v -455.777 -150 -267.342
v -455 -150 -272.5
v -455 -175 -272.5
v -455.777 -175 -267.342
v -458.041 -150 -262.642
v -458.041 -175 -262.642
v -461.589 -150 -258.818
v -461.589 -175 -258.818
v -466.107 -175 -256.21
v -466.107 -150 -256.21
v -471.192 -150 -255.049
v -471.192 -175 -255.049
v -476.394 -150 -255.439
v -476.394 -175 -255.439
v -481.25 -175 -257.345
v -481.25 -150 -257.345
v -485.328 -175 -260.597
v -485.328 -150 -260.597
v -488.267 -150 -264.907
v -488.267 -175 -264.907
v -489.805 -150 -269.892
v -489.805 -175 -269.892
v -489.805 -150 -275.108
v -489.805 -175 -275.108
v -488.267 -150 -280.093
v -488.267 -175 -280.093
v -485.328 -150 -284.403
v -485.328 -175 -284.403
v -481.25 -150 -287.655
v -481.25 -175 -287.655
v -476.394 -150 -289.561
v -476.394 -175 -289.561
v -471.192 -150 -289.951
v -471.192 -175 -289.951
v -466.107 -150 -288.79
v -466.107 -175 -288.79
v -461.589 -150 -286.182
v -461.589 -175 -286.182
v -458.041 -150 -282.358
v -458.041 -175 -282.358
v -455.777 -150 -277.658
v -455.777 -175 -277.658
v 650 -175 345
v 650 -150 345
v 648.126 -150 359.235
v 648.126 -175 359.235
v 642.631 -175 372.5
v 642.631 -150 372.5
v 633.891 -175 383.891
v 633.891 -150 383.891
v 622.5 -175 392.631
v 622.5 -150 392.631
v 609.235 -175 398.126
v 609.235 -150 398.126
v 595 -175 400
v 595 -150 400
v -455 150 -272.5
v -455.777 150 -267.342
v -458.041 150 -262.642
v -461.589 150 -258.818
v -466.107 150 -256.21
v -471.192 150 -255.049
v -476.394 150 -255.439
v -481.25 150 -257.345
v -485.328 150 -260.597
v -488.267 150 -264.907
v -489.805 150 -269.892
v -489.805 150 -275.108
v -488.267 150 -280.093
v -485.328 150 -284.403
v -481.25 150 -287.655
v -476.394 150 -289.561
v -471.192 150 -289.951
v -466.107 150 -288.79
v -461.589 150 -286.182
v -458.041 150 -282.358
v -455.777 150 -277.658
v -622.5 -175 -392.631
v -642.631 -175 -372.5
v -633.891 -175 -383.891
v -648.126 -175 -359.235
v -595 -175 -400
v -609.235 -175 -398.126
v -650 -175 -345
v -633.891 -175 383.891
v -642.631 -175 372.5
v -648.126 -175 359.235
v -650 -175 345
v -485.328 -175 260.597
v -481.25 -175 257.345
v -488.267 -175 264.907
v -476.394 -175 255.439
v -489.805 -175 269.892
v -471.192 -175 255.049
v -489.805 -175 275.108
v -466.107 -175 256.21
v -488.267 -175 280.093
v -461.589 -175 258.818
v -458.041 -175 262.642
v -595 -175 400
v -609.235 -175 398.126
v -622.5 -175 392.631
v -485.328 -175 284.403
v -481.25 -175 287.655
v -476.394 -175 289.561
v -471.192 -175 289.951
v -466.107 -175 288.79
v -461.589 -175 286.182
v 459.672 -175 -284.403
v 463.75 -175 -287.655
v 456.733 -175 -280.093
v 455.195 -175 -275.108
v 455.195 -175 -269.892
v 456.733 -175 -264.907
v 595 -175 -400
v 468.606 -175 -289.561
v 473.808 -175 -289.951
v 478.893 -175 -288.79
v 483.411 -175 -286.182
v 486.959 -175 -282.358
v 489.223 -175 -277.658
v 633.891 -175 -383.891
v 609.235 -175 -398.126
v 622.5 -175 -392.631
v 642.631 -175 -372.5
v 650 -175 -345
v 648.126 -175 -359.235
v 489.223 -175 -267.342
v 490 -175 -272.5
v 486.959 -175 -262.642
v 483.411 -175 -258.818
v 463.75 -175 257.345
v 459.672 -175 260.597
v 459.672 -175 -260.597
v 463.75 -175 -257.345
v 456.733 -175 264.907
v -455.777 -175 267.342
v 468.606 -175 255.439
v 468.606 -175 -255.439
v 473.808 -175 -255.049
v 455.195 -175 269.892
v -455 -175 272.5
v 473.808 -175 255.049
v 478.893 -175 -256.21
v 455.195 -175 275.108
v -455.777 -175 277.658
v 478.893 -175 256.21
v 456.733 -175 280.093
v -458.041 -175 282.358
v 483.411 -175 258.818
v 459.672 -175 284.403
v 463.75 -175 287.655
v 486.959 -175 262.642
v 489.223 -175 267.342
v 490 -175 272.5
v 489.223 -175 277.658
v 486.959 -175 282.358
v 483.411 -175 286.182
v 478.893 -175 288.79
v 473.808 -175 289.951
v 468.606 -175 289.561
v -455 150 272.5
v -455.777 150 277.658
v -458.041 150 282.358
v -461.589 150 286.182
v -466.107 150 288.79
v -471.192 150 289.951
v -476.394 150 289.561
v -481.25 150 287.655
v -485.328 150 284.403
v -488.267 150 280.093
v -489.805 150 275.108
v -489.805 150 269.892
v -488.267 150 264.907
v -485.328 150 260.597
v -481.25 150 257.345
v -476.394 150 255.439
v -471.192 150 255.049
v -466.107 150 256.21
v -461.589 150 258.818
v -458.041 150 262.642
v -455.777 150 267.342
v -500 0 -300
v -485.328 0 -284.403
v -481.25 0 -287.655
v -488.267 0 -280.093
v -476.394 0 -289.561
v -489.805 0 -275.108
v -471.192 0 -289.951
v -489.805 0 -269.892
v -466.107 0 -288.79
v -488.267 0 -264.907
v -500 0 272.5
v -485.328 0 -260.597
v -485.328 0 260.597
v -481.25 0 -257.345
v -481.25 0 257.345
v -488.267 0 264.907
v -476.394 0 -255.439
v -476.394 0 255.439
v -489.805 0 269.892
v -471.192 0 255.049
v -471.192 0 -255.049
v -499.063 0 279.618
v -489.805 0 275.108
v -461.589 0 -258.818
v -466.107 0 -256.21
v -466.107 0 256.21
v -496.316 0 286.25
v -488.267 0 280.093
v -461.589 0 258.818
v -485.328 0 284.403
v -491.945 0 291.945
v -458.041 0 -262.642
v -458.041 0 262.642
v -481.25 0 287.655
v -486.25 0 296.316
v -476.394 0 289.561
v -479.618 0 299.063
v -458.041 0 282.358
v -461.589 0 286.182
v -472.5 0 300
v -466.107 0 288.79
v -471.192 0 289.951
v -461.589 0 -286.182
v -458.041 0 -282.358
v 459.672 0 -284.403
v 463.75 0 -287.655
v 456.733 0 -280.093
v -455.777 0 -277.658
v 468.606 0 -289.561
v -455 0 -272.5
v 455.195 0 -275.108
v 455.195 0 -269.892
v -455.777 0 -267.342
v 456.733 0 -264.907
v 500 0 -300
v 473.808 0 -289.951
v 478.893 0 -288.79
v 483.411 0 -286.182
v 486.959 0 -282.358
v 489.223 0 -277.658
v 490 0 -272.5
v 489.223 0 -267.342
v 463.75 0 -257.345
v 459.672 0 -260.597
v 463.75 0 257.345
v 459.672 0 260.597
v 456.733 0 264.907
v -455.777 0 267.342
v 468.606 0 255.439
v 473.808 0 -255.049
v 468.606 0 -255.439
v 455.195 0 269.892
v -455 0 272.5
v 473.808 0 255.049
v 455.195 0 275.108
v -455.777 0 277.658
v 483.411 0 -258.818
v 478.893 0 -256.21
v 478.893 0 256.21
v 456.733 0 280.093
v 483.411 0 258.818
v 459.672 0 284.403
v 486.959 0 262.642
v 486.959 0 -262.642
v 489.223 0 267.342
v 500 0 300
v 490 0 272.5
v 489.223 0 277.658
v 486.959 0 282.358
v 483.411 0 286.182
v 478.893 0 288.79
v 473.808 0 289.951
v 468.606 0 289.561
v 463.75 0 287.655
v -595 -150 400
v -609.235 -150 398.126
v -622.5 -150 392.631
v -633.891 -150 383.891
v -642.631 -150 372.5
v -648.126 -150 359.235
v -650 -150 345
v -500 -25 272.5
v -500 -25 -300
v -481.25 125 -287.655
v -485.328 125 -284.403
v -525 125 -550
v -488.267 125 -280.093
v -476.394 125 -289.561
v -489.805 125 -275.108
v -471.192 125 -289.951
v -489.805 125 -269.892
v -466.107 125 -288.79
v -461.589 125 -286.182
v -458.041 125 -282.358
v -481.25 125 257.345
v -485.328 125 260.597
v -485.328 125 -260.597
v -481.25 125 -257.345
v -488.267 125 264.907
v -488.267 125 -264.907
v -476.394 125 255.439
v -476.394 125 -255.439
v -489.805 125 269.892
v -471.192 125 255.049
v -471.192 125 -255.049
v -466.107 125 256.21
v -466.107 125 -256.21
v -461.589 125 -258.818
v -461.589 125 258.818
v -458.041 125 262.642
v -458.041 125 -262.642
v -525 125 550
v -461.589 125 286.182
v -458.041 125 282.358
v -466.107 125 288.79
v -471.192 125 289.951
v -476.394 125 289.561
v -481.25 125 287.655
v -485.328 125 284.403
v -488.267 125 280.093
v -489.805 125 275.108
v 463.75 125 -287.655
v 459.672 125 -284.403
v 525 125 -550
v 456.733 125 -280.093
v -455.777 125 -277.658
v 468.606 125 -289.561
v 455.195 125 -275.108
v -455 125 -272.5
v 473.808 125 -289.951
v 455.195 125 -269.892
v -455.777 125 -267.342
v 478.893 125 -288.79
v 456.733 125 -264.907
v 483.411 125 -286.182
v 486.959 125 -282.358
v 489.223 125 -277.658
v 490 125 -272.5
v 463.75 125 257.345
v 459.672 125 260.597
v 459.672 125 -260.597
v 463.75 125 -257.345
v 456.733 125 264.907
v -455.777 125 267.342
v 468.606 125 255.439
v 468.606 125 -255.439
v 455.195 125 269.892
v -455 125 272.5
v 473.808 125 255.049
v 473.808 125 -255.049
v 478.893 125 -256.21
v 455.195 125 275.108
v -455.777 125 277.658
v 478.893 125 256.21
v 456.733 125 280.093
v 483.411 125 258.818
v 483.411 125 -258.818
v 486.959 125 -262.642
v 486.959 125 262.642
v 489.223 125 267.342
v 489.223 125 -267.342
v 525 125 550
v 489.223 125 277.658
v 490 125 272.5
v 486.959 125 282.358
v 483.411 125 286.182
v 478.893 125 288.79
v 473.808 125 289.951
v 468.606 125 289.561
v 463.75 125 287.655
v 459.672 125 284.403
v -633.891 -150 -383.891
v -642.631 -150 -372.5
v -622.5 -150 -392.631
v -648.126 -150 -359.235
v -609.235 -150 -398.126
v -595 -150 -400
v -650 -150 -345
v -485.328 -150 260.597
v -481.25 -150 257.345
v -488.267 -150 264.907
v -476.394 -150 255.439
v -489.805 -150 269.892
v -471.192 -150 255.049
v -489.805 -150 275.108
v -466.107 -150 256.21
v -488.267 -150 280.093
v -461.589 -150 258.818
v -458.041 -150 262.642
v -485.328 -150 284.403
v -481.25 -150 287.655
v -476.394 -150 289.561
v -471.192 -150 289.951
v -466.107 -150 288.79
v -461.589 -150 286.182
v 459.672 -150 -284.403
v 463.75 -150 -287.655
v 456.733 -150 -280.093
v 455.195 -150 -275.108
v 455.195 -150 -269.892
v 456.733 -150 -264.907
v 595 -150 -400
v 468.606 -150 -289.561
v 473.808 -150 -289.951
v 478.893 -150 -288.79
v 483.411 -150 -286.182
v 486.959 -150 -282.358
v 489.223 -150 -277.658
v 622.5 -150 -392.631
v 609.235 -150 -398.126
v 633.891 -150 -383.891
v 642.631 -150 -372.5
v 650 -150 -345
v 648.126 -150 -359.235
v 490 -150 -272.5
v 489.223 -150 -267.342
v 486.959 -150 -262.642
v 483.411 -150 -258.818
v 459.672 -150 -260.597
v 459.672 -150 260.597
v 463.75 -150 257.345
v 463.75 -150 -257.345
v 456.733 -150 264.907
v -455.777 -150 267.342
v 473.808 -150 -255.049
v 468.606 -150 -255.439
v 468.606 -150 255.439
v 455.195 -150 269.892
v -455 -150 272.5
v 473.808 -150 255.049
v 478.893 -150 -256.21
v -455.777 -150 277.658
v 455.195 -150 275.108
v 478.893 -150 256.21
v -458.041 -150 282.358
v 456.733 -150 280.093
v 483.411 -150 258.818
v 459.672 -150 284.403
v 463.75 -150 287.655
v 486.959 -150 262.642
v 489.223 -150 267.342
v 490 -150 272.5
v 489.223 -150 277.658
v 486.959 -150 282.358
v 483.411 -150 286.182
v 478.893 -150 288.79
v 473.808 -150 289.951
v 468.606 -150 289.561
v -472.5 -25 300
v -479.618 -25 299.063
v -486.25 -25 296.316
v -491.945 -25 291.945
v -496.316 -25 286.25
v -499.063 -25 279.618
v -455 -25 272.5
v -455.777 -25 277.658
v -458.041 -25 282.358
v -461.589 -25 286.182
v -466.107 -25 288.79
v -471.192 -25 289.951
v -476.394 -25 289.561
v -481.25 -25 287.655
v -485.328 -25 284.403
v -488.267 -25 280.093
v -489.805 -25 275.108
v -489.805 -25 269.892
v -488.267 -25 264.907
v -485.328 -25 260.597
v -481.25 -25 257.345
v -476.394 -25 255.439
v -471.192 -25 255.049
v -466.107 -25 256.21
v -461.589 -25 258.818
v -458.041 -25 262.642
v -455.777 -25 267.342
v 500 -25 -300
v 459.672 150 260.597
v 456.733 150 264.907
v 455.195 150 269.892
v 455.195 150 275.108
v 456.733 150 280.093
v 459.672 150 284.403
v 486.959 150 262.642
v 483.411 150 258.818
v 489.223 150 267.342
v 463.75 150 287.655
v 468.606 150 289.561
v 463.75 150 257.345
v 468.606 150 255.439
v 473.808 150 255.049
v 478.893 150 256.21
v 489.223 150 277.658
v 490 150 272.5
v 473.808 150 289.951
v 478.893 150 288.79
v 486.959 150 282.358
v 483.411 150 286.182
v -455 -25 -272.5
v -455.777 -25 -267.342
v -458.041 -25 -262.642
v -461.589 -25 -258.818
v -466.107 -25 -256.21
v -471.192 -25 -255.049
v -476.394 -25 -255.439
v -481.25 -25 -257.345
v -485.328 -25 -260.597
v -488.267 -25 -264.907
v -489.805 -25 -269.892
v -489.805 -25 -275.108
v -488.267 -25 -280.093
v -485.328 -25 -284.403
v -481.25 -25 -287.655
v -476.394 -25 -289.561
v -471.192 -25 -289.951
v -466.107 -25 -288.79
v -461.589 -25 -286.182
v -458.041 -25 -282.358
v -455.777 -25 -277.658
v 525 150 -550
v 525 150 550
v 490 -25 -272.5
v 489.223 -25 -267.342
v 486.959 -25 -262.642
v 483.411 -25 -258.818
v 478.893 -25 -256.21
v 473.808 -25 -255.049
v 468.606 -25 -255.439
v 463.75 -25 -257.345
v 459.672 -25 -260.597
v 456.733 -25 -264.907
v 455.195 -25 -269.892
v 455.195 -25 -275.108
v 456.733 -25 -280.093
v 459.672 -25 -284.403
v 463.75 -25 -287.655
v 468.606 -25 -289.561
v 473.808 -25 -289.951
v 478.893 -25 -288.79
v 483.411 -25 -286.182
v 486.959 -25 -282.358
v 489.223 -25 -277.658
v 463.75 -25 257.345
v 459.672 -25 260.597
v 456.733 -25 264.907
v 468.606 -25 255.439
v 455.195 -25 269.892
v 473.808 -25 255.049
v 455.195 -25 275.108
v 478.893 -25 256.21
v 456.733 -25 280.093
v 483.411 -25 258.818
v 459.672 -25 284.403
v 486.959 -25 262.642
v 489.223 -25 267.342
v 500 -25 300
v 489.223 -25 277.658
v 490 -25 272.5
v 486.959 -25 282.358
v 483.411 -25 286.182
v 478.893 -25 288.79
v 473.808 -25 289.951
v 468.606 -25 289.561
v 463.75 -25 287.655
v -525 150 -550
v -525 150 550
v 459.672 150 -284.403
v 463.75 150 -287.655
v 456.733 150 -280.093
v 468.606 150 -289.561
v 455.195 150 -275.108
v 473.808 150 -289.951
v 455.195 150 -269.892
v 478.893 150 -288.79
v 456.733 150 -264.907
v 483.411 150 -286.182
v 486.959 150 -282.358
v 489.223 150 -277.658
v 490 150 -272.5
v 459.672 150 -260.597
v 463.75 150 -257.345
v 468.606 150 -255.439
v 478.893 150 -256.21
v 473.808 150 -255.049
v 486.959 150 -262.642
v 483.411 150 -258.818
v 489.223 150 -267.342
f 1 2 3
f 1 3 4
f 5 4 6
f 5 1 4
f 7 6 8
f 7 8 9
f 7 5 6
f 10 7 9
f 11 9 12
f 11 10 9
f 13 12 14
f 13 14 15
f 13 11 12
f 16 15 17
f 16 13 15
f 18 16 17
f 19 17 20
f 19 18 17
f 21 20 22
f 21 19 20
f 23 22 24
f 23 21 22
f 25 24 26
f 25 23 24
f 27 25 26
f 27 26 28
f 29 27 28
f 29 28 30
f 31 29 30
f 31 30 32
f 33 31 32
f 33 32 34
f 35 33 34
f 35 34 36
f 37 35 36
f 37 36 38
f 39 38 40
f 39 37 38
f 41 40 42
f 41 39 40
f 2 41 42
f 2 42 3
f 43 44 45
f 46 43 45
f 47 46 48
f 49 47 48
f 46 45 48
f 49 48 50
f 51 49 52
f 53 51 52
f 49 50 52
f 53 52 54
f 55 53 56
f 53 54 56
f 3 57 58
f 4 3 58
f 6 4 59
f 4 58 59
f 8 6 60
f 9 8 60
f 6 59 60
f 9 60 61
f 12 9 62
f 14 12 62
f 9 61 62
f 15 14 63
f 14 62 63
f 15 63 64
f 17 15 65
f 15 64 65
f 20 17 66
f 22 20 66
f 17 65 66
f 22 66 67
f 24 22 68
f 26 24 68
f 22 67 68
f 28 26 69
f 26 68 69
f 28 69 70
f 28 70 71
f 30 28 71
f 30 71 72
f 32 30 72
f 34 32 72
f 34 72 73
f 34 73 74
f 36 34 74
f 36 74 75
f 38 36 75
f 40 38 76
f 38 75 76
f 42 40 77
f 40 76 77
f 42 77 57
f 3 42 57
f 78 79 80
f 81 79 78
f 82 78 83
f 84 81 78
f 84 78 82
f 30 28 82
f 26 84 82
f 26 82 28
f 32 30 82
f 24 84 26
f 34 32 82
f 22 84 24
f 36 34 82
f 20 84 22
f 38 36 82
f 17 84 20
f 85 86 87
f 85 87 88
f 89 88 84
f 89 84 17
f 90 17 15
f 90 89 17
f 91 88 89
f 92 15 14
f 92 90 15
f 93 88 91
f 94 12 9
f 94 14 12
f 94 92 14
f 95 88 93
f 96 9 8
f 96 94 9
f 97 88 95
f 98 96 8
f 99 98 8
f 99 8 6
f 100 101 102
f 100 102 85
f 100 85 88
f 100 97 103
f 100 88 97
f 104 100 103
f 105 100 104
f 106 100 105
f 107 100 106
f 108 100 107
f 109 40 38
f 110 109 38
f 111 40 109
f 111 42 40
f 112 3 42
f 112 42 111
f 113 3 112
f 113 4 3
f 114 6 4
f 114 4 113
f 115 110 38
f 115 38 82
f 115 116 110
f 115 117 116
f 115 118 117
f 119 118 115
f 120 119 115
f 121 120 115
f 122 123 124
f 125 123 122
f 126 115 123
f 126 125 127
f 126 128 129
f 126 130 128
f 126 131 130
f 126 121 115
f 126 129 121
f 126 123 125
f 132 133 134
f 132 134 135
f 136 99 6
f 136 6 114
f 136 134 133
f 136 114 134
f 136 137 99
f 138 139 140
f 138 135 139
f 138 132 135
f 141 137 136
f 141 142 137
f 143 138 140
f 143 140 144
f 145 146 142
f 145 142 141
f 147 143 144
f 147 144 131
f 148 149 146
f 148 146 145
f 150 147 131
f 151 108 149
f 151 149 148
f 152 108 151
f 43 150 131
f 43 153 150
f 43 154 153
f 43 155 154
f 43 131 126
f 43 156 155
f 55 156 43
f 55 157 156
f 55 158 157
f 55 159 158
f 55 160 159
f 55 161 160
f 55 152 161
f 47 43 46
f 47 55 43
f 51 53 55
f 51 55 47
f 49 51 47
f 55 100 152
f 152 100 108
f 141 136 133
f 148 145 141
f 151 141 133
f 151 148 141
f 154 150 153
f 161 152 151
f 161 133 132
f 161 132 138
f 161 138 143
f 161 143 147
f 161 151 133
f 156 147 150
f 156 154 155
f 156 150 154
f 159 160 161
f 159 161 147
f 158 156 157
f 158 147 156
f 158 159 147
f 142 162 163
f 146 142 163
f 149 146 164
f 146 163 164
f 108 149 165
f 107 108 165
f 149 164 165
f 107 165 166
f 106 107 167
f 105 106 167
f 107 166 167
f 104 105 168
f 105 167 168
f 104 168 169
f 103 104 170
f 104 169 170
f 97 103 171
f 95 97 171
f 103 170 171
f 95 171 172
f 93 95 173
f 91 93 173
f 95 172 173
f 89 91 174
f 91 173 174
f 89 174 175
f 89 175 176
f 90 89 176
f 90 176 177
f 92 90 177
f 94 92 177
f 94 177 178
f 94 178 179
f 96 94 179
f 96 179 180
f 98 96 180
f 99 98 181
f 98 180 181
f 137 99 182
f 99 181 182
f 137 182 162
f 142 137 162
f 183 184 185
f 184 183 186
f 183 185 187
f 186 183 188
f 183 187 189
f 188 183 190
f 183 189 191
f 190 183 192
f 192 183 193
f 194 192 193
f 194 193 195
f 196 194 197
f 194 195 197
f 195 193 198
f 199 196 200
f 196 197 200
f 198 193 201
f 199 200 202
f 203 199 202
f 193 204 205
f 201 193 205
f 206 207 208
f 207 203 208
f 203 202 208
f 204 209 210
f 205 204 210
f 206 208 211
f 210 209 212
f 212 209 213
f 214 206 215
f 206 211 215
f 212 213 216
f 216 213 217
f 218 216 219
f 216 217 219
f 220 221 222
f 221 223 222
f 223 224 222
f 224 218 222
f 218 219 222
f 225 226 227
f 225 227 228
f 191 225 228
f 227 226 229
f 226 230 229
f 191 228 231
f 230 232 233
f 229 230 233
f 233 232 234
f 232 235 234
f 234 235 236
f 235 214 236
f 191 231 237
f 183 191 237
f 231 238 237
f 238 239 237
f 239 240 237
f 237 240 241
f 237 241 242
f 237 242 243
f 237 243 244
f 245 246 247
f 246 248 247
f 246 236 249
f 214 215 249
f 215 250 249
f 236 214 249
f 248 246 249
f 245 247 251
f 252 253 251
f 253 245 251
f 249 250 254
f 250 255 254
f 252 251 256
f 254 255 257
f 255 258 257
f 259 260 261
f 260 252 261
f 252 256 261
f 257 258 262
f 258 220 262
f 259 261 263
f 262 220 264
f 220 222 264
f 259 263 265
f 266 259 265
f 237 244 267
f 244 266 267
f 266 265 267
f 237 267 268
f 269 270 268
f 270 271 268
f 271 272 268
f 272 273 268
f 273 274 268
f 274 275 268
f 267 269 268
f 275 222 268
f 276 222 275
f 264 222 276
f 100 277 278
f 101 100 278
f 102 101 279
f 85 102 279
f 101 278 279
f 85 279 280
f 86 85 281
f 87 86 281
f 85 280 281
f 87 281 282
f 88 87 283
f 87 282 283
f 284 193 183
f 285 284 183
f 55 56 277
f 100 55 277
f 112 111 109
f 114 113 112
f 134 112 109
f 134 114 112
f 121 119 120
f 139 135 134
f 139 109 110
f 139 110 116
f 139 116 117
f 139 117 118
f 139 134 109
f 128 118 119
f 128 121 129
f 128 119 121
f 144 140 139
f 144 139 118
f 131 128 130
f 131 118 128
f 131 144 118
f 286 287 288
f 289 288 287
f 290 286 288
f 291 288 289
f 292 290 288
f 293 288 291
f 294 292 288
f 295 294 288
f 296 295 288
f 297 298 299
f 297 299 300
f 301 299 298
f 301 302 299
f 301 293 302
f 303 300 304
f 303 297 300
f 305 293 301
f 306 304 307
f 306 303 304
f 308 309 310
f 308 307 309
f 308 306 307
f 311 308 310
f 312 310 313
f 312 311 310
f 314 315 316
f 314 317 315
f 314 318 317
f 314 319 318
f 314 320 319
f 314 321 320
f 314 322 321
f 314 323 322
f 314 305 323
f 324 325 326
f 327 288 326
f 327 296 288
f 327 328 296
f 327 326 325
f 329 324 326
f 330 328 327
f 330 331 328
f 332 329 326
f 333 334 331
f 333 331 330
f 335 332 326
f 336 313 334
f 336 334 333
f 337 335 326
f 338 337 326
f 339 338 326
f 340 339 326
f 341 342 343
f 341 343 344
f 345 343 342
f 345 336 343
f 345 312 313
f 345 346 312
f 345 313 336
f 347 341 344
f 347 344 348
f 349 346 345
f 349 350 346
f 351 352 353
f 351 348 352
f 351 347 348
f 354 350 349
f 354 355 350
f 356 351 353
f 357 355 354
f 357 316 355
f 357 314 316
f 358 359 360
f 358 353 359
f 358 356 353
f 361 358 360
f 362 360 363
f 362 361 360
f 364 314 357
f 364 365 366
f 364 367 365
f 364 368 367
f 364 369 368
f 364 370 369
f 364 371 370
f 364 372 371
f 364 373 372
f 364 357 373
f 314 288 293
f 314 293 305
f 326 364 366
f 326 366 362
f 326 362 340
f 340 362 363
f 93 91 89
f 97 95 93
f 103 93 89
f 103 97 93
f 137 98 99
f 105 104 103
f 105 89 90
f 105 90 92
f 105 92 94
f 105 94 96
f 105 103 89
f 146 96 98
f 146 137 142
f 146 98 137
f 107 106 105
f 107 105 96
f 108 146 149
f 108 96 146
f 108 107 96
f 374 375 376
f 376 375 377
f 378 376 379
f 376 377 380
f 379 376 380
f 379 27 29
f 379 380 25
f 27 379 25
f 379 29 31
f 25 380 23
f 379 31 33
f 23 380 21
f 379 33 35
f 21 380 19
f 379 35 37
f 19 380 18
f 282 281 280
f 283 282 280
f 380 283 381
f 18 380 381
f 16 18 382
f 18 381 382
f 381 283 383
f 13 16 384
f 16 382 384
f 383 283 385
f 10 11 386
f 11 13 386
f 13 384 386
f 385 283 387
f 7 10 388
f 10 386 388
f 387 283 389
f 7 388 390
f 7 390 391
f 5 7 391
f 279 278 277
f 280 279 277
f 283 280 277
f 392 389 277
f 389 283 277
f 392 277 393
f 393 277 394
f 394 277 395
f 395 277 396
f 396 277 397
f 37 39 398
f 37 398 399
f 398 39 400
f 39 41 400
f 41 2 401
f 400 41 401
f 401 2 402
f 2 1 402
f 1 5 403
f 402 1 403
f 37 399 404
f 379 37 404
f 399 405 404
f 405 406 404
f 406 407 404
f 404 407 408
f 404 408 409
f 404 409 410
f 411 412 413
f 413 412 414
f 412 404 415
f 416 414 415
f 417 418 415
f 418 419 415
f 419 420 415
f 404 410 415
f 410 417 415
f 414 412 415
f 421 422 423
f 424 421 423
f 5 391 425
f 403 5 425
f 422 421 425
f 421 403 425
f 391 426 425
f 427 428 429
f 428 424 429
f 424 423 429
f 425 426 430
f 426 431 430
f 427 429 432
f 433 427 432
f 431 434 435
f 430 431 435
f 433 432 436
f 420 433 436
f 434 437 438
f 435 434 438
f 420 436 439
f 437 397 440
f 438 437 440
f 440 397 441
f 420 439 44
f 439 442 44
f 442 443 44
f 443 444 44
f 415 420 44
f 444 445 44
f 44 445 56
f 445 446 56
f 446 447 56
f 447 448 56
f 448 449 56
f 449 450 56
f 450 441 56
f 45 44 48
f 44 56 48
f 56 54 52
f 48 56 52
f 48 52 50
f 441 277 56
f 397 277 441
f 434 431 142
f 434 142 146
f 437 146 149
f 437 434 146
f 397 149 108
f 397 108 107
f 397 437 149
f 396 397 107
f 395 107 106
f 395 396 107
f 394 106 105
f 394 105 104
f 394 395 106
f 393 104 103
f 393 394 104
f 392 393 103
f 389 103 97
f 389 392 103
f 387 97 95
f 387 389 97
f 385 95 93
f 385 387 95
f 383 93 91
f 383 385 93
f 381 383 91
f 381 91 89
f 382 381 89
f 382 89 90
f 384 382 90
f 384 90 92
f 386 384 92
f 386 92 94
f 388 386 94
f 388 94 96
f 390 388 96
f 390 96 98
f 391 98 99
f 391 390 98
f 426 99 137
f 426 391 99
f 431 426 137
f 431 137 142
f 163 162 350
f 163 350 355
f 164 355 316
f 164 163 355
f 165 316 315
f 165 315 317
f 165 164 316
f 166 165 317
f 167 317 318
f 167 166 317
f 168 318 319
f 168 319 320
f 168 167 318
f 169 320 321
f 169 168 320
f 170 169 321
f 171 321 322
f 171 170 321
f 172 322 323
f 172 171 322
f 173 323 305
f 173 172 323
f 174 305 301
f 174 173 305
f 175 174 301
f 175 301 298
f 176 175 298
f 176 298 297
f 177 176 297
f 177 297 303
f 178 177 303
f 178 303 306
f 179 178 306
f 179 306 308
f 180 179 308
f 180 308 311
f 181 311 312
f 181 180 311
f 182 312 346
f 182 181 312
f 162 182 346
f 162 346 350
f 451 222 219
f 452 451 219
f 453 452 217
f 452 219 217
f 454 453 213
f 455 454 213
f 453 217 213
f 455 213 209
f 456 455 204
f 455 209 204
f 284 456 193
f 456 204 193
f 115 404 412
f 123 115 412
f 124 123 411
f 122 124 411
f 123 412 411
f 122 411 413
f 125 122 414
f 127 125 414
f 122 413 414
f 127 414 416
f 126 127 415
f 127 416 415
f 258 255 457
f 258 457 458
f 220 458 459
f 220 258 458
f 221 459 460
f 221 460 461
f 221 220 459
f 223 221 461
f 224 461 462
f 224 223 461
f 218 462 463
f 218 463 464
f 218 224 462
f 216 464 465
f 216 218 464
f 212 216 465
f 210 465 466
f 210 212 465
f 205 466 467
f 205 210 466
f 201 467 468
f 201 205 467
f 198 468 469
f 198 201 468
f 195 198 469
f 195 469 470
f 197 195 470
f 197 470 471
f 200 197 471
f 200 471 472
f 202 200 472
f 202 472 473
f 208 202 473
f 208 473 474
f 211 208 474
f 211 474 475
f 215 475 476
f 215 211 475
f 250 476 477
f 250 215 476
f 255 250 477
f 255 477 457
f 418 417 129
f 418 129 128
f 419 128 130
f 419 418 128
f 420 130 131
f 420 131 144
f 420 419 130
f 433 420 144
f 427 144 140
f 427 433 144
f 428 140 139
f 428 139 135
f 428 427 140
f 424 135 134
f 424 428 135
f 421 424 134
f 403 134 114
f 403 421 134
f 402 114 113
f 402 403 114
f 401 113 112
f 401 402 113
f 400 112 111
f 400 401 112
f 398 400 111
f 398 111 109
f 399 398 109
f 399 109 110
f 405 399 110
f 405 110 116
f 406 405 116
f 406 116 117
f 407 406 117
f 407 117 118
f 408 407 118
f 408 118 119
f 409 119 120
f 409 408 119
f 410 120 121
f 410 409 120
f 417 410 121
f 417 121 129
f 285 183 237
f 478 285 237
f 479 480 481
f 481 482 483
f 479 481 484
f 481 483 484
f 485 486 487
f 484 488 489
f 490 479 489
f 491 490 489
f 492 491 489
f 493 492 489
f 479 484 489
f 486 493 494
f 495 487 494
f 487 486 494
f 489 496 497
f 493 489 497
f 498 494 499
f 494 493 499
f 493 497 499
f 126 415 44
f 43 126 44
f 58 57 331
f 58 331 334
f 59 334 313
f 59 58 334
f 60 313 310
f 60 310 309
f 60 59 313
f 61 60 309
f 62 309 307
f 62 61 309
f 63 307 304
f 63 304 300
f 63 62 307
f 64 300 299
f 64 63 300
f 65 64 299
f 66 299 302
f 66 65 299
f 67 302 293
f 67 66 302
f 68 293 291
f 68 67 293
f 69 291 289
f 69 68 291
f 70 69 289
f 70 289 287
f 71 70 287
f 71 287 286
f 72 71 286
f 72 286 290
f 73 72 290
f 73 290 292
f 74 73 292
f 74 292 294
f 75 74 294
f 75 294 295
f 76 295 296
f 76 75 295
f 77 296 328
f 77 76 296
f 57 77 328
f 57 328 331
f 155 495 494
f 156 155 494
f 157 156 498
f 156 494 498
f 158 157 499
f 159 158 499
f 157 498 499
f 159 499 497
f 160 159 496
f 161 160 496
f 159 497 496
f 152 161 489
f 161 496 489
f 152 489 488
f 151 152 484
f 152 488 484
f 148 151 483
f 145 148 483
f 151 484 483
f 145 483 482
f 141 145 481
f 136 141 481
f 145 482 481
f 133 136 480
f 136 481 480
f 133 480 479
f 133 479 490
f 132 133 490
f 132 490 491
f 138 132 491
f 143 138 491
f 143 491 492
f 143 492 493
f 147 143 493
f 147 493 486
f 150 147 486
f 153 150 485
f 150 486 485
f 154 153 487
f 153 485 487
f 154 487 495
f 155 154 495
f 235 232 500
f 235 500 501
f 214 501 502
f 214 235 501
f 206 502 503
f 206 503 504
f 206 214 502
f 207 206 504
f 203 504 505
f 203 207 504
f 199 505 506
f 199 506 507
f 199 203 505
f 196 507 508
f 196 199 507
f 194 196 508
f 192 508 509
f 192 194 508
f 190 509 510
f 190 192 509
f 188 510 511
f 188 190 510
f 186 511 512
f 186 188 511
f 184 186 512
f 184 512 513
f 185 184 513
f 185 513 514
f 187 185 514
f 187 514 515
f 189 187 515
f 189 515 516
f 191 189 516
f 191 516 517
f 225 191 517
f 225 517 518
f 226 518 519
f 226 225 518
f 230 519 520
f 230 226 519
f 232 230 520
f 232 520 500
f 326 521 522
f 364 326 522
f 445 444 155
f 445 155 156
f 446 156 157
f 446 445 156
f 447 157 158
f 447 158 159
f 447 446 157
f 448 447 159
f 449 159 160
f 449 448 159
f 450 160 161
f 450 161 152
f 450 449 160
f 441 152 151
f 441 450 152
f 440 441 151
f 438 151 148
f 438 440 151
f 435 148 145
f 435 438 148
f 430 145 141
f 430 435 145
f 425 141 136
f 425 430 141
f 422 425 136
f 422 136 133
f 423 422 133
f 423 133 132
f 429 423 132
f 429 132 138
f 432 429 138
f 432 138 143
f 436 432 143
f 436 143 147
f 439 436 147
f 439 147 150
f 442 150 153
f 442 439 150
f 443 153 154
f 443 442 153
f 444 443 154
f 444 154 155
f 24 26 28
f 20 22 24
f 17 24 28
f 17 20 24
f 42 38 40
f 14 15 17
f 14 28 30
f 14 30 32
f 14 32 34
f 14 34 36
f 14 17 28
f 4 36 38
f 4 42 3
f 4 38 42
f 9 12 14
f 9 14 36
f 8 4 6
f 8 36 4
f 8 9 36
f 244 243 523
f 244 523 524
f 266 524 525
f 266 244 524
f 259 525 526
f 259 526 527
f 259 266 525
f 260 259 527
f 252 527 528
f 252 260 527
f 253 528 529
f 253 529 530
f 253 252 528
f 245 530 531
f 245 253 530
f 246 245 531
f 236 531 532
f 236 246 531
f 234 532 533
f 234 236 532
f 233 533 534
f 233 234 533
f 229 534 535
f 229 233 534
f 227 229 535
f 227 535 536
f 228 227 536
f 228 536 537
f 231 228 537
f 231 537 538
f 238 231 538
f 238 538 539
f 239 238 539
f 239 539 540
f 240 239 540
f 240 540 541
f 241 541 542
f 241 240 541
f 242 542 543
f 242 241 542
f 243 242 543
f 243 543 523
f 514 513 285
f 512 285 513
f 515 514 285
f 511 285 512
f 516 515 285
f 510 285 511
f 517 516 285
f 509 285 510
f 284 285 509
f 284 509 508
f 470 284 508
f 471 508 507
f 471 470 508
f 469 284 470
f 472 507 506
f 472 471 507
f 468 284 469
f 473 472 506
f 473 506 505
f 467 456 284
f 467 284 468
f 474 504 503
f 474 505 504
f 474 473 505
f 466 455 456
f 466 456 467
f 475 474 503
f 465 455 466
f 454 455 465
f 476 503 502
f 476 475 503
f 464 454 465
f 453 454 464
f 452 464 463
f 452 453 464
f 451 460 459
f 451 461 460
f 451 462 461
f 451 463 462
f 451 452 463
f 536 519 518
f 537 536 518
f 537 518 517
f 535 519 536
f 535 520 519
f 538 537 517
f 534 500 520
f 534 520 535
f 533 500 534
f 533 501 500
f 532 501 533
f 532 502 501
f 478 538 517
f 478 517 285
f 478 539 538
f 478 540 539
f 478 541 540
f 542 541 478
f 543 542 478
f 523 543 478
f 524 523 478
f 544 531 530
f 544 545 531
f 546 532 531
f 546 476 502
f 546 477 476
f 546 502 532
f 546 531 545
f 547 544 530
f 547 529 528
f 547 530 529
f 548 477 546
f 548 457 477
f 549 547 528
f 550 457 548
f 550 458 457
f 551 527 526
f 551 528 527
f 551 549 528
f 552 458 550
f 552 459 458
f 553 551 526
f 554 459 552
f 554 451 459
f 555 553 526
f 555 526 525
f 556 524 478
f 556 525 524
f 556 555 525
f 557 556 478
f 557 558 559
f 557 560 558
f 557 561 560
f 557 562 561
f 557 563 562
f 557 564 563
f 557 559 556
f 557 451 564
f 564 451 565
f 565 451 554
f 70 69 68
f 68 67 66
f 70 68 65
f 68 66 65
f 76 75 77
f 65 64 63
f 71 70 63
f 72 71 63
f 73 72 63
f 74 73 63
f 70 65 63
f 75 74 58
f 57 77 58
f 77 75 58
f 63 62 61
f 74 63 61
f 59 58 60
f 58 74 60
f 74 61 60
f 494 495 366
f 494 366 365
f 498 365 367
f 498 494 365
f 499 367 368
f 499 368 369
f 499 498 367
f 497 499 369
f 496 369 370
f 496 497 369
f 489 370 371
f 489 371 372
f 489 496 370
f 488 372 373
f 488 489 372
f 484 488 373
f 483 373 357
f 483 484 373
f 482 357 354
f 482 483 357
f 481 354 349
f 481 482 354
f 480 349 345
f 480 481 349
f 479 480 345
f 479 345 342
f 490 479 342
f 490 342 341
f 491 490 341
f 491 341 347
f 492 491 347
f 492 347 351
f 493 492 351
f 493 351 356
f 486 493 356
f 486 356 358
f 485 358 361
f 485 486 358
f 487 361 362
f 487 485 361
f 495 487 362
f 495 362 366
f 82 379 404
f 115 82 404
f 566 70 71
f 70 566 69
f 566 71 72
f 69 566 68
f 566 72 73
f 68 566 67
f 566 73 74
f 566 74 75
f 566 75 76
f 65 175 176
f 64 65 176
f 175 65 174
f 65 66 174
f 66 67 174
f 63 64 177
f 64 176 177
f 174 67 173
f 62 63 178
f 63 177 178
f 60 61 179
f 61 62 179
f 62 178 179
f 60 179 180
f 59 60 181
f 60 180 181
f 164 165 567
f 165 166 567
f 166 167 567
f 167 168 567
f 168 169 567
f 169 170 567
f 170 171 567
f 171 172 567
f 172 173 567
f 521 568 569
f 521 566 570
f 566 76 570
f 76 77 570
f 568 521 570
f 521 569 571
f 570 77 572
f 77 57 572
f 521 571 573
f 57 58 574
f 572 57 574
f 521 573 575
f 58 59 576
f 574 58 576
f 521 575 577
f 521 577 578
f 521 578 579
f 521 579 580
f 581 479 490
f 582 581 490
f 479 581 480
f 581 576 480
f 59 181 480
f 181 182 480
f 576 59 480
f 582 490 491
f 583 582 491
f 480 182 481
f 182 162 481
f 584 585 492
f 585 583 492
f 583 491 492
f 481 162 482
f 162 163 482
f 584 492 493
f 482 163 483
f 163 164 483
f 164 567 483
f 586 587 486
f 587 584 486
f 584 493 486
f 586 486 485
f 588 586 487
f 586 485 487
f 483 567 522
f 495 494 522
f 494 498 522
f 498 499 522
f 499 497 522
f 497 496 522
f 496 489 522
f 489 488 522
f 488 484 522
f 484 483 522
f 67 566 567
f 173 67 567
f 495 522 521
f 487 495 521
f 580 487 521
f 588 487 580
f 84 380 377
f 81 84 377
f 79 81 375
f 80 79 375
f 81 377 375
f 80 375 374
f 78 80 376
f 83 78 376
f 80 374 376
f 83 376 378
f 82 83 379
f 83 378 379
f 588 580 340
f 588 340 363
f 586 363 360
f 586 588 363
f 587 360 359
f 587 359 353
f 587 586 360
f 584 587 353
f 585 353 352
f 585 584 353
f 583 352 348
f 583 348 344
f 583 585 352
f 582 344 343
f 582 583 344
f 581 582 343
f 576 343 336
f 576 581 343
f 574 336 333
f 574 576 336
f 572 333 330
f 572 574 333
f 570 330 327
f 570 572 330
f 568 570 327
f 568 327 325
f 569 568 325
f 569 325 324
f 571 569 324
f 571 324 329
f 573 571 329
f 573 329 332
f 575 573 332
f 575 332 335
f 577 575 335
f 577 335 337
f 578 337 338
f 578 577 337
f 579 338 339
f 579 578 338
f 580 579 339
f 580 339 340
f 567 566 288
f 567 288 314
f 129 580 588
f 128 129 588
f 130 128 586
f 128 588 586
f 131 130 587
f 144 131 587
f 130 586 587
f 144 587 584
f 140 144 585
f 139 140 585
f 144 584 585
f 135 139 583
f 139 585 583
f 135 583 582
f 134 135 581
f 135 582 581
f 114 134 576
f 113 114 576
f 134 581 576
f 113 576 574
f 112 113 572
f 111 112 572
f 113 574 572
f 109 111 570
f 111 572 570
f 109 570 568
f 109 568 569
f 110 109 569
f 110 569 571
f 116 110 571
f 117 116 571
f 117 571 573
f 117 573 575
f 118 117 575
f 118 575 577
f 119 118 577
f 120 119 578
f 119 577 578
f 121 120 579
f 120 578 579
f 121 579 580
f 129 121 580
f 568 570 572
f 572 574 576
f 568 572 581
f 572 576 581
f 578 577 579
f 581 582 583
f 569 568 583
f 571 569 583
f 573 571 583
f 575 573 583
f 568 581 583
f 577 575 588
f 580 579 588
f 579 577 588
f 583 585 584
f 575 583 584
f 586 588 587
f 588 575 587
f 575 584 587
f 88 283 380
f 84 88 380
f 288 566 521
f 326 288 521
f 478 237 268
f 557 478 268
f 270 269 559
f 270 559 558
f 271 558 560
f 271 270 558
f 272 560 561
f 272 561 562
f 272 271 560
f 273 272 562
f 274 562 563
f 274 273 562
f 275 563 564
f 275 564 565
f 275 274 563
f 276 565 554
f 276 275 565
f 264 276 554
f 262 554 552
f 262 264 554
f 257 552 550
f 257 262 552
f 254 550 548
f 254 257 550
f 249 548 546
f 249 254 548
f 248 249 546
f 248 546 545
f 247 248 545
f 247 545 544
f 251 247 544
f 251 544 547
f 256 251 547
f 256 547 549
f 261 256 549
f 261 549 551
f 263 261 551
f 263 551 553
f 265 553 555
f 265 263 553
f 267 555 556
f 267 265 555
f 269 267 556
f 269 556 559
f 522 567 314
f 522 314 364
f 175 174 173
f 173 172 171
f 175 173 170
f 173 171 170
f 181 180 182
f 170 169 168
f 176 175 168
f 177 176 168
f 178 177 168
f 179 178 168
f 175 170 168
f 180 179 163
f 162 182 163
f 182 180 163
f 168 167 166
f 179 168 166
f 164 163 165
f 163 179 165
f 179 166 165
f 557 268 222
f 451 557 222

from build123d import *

# Parameters (mm, degrees)
F0_R     = 17.5
F1_DEPTH = 25
F3_R     = 17.5
F4_DEPTH = 25
F6_W     = 1050
F6_H     = 1100
F6_R     = 17.5
F7_DEPTH = 25
F8_R     = 17.5
F9_DEPTH = 325


with BuildPart() as f1:
    # F0 (on Front) → F1 (new body)
    with BuildSketch(Plane.XZ):
        with BuildLine():
            Line((-500, -300), (500, -300))
            Line((500, -300), (500, 300))
            Line((500, 300), (-472.5, 300))
            ThreePointArc((-472.5, 300), (-491.945436, 291.945436), (-500, 272.5))
            Line((-500, 272.5), (-500, -300))
        make_face()
        with Locations((-472.5, -272.5)):
            Circle(F0_R, mode=Mode.SUBTRACT)
        with Locations((472.5, -272.5)):
            Circle(F0_R, mode=Mode.SUBTRACT)
        with Locations((-472.5, 272.5)):
            Circle(F0_R, mode=Mode.SUBTRACT)
        with Locations((472.5, 272.5)):
            Circle(F0_R, mode=Mode.SUBTRACT)
    extrude(amount=F1_DEPTH)


with BuildPart() as f4:
    # F3 (on offset) → F4 (new body)
    with BuildSketch(Plane.XZ.offset(150)):
        with BuildLine():
            Line((-595, -400), (595, -400))
            ThreePointArc((595, -400), (633.890873, -383.890873), (650, -345))
            Line((650, -345), (650, 345))
            ThreePointArc((650, 345), (633.890873, 383.890873), (595, 400))
            Line((595, 400), (-595, 400))
            ThreePointArc((-595, 400), (-633.890873, 383.890873), (-650, 345))
            Line((-650, 345), (-650, -345))
            ThreePointArc((-650, -345), (-633.890873, -383.890873), (-595, -400))
        make_face()
        with Locations((-472.5, -272.5)):
            Circle(F3_R, mode=Mode.SUBTRACT)
        with Locations((472.5, -272.5)):
            Circle(F3_R, mode=Mode.SUBTRACT)
        with Locations((-472.5, 272.5)):
            Circle(F3_R, mode=Mode.SUBTRACT)
        with Locations((472.5, 272.5)):
            Circle(F3_R, mode=Mode.SUBTRACT)
    extrude(amount=F4_DEPTH)


with BuildPart() as f7:
    # F6 (on offset) → F7 (new body)
    with BuildSketch(Plane.XZ.offset(-150)):
        Rectangle(F6_W, F6_H)
        with Locations((-472.5, -272.5)):
            Circle(F6_R, mode=Mode.SUBTRACT)
        with Locations((472.5, -272.5)):
            Circle(F6_R, mode=Mode.SUBTRACT)
        with Locations((-472.5, 272.5)):
            Circle(F6_R, mode=Mode.SUBTRACT)
        with Locations((472.5, 272.5)):
            Circle(F6_R, mode=Mode.SUBTRACT)
    extrude(amount=F7_DEPTH)


with BuildPart() as f9:
    # F8 (on offset) → F9 (new body, through all)
    with BuildSketch(Plane.XZ.offset(-150)):
        with Locations((-472.5, 272.5)):
            Circle(F8_R)
        with Locations((-472.5, -272.5)):
            Circle(F8_R)
        with Locations((472.5, -272.5)):
            Circle(F8_R)
        with Locations((472.5, 272.5)):
            Circle(F8_R)
    extrude(amount=F9_DEPTH)


solid = Compound([f1.part, f4.part, f7.part, f9.part])
